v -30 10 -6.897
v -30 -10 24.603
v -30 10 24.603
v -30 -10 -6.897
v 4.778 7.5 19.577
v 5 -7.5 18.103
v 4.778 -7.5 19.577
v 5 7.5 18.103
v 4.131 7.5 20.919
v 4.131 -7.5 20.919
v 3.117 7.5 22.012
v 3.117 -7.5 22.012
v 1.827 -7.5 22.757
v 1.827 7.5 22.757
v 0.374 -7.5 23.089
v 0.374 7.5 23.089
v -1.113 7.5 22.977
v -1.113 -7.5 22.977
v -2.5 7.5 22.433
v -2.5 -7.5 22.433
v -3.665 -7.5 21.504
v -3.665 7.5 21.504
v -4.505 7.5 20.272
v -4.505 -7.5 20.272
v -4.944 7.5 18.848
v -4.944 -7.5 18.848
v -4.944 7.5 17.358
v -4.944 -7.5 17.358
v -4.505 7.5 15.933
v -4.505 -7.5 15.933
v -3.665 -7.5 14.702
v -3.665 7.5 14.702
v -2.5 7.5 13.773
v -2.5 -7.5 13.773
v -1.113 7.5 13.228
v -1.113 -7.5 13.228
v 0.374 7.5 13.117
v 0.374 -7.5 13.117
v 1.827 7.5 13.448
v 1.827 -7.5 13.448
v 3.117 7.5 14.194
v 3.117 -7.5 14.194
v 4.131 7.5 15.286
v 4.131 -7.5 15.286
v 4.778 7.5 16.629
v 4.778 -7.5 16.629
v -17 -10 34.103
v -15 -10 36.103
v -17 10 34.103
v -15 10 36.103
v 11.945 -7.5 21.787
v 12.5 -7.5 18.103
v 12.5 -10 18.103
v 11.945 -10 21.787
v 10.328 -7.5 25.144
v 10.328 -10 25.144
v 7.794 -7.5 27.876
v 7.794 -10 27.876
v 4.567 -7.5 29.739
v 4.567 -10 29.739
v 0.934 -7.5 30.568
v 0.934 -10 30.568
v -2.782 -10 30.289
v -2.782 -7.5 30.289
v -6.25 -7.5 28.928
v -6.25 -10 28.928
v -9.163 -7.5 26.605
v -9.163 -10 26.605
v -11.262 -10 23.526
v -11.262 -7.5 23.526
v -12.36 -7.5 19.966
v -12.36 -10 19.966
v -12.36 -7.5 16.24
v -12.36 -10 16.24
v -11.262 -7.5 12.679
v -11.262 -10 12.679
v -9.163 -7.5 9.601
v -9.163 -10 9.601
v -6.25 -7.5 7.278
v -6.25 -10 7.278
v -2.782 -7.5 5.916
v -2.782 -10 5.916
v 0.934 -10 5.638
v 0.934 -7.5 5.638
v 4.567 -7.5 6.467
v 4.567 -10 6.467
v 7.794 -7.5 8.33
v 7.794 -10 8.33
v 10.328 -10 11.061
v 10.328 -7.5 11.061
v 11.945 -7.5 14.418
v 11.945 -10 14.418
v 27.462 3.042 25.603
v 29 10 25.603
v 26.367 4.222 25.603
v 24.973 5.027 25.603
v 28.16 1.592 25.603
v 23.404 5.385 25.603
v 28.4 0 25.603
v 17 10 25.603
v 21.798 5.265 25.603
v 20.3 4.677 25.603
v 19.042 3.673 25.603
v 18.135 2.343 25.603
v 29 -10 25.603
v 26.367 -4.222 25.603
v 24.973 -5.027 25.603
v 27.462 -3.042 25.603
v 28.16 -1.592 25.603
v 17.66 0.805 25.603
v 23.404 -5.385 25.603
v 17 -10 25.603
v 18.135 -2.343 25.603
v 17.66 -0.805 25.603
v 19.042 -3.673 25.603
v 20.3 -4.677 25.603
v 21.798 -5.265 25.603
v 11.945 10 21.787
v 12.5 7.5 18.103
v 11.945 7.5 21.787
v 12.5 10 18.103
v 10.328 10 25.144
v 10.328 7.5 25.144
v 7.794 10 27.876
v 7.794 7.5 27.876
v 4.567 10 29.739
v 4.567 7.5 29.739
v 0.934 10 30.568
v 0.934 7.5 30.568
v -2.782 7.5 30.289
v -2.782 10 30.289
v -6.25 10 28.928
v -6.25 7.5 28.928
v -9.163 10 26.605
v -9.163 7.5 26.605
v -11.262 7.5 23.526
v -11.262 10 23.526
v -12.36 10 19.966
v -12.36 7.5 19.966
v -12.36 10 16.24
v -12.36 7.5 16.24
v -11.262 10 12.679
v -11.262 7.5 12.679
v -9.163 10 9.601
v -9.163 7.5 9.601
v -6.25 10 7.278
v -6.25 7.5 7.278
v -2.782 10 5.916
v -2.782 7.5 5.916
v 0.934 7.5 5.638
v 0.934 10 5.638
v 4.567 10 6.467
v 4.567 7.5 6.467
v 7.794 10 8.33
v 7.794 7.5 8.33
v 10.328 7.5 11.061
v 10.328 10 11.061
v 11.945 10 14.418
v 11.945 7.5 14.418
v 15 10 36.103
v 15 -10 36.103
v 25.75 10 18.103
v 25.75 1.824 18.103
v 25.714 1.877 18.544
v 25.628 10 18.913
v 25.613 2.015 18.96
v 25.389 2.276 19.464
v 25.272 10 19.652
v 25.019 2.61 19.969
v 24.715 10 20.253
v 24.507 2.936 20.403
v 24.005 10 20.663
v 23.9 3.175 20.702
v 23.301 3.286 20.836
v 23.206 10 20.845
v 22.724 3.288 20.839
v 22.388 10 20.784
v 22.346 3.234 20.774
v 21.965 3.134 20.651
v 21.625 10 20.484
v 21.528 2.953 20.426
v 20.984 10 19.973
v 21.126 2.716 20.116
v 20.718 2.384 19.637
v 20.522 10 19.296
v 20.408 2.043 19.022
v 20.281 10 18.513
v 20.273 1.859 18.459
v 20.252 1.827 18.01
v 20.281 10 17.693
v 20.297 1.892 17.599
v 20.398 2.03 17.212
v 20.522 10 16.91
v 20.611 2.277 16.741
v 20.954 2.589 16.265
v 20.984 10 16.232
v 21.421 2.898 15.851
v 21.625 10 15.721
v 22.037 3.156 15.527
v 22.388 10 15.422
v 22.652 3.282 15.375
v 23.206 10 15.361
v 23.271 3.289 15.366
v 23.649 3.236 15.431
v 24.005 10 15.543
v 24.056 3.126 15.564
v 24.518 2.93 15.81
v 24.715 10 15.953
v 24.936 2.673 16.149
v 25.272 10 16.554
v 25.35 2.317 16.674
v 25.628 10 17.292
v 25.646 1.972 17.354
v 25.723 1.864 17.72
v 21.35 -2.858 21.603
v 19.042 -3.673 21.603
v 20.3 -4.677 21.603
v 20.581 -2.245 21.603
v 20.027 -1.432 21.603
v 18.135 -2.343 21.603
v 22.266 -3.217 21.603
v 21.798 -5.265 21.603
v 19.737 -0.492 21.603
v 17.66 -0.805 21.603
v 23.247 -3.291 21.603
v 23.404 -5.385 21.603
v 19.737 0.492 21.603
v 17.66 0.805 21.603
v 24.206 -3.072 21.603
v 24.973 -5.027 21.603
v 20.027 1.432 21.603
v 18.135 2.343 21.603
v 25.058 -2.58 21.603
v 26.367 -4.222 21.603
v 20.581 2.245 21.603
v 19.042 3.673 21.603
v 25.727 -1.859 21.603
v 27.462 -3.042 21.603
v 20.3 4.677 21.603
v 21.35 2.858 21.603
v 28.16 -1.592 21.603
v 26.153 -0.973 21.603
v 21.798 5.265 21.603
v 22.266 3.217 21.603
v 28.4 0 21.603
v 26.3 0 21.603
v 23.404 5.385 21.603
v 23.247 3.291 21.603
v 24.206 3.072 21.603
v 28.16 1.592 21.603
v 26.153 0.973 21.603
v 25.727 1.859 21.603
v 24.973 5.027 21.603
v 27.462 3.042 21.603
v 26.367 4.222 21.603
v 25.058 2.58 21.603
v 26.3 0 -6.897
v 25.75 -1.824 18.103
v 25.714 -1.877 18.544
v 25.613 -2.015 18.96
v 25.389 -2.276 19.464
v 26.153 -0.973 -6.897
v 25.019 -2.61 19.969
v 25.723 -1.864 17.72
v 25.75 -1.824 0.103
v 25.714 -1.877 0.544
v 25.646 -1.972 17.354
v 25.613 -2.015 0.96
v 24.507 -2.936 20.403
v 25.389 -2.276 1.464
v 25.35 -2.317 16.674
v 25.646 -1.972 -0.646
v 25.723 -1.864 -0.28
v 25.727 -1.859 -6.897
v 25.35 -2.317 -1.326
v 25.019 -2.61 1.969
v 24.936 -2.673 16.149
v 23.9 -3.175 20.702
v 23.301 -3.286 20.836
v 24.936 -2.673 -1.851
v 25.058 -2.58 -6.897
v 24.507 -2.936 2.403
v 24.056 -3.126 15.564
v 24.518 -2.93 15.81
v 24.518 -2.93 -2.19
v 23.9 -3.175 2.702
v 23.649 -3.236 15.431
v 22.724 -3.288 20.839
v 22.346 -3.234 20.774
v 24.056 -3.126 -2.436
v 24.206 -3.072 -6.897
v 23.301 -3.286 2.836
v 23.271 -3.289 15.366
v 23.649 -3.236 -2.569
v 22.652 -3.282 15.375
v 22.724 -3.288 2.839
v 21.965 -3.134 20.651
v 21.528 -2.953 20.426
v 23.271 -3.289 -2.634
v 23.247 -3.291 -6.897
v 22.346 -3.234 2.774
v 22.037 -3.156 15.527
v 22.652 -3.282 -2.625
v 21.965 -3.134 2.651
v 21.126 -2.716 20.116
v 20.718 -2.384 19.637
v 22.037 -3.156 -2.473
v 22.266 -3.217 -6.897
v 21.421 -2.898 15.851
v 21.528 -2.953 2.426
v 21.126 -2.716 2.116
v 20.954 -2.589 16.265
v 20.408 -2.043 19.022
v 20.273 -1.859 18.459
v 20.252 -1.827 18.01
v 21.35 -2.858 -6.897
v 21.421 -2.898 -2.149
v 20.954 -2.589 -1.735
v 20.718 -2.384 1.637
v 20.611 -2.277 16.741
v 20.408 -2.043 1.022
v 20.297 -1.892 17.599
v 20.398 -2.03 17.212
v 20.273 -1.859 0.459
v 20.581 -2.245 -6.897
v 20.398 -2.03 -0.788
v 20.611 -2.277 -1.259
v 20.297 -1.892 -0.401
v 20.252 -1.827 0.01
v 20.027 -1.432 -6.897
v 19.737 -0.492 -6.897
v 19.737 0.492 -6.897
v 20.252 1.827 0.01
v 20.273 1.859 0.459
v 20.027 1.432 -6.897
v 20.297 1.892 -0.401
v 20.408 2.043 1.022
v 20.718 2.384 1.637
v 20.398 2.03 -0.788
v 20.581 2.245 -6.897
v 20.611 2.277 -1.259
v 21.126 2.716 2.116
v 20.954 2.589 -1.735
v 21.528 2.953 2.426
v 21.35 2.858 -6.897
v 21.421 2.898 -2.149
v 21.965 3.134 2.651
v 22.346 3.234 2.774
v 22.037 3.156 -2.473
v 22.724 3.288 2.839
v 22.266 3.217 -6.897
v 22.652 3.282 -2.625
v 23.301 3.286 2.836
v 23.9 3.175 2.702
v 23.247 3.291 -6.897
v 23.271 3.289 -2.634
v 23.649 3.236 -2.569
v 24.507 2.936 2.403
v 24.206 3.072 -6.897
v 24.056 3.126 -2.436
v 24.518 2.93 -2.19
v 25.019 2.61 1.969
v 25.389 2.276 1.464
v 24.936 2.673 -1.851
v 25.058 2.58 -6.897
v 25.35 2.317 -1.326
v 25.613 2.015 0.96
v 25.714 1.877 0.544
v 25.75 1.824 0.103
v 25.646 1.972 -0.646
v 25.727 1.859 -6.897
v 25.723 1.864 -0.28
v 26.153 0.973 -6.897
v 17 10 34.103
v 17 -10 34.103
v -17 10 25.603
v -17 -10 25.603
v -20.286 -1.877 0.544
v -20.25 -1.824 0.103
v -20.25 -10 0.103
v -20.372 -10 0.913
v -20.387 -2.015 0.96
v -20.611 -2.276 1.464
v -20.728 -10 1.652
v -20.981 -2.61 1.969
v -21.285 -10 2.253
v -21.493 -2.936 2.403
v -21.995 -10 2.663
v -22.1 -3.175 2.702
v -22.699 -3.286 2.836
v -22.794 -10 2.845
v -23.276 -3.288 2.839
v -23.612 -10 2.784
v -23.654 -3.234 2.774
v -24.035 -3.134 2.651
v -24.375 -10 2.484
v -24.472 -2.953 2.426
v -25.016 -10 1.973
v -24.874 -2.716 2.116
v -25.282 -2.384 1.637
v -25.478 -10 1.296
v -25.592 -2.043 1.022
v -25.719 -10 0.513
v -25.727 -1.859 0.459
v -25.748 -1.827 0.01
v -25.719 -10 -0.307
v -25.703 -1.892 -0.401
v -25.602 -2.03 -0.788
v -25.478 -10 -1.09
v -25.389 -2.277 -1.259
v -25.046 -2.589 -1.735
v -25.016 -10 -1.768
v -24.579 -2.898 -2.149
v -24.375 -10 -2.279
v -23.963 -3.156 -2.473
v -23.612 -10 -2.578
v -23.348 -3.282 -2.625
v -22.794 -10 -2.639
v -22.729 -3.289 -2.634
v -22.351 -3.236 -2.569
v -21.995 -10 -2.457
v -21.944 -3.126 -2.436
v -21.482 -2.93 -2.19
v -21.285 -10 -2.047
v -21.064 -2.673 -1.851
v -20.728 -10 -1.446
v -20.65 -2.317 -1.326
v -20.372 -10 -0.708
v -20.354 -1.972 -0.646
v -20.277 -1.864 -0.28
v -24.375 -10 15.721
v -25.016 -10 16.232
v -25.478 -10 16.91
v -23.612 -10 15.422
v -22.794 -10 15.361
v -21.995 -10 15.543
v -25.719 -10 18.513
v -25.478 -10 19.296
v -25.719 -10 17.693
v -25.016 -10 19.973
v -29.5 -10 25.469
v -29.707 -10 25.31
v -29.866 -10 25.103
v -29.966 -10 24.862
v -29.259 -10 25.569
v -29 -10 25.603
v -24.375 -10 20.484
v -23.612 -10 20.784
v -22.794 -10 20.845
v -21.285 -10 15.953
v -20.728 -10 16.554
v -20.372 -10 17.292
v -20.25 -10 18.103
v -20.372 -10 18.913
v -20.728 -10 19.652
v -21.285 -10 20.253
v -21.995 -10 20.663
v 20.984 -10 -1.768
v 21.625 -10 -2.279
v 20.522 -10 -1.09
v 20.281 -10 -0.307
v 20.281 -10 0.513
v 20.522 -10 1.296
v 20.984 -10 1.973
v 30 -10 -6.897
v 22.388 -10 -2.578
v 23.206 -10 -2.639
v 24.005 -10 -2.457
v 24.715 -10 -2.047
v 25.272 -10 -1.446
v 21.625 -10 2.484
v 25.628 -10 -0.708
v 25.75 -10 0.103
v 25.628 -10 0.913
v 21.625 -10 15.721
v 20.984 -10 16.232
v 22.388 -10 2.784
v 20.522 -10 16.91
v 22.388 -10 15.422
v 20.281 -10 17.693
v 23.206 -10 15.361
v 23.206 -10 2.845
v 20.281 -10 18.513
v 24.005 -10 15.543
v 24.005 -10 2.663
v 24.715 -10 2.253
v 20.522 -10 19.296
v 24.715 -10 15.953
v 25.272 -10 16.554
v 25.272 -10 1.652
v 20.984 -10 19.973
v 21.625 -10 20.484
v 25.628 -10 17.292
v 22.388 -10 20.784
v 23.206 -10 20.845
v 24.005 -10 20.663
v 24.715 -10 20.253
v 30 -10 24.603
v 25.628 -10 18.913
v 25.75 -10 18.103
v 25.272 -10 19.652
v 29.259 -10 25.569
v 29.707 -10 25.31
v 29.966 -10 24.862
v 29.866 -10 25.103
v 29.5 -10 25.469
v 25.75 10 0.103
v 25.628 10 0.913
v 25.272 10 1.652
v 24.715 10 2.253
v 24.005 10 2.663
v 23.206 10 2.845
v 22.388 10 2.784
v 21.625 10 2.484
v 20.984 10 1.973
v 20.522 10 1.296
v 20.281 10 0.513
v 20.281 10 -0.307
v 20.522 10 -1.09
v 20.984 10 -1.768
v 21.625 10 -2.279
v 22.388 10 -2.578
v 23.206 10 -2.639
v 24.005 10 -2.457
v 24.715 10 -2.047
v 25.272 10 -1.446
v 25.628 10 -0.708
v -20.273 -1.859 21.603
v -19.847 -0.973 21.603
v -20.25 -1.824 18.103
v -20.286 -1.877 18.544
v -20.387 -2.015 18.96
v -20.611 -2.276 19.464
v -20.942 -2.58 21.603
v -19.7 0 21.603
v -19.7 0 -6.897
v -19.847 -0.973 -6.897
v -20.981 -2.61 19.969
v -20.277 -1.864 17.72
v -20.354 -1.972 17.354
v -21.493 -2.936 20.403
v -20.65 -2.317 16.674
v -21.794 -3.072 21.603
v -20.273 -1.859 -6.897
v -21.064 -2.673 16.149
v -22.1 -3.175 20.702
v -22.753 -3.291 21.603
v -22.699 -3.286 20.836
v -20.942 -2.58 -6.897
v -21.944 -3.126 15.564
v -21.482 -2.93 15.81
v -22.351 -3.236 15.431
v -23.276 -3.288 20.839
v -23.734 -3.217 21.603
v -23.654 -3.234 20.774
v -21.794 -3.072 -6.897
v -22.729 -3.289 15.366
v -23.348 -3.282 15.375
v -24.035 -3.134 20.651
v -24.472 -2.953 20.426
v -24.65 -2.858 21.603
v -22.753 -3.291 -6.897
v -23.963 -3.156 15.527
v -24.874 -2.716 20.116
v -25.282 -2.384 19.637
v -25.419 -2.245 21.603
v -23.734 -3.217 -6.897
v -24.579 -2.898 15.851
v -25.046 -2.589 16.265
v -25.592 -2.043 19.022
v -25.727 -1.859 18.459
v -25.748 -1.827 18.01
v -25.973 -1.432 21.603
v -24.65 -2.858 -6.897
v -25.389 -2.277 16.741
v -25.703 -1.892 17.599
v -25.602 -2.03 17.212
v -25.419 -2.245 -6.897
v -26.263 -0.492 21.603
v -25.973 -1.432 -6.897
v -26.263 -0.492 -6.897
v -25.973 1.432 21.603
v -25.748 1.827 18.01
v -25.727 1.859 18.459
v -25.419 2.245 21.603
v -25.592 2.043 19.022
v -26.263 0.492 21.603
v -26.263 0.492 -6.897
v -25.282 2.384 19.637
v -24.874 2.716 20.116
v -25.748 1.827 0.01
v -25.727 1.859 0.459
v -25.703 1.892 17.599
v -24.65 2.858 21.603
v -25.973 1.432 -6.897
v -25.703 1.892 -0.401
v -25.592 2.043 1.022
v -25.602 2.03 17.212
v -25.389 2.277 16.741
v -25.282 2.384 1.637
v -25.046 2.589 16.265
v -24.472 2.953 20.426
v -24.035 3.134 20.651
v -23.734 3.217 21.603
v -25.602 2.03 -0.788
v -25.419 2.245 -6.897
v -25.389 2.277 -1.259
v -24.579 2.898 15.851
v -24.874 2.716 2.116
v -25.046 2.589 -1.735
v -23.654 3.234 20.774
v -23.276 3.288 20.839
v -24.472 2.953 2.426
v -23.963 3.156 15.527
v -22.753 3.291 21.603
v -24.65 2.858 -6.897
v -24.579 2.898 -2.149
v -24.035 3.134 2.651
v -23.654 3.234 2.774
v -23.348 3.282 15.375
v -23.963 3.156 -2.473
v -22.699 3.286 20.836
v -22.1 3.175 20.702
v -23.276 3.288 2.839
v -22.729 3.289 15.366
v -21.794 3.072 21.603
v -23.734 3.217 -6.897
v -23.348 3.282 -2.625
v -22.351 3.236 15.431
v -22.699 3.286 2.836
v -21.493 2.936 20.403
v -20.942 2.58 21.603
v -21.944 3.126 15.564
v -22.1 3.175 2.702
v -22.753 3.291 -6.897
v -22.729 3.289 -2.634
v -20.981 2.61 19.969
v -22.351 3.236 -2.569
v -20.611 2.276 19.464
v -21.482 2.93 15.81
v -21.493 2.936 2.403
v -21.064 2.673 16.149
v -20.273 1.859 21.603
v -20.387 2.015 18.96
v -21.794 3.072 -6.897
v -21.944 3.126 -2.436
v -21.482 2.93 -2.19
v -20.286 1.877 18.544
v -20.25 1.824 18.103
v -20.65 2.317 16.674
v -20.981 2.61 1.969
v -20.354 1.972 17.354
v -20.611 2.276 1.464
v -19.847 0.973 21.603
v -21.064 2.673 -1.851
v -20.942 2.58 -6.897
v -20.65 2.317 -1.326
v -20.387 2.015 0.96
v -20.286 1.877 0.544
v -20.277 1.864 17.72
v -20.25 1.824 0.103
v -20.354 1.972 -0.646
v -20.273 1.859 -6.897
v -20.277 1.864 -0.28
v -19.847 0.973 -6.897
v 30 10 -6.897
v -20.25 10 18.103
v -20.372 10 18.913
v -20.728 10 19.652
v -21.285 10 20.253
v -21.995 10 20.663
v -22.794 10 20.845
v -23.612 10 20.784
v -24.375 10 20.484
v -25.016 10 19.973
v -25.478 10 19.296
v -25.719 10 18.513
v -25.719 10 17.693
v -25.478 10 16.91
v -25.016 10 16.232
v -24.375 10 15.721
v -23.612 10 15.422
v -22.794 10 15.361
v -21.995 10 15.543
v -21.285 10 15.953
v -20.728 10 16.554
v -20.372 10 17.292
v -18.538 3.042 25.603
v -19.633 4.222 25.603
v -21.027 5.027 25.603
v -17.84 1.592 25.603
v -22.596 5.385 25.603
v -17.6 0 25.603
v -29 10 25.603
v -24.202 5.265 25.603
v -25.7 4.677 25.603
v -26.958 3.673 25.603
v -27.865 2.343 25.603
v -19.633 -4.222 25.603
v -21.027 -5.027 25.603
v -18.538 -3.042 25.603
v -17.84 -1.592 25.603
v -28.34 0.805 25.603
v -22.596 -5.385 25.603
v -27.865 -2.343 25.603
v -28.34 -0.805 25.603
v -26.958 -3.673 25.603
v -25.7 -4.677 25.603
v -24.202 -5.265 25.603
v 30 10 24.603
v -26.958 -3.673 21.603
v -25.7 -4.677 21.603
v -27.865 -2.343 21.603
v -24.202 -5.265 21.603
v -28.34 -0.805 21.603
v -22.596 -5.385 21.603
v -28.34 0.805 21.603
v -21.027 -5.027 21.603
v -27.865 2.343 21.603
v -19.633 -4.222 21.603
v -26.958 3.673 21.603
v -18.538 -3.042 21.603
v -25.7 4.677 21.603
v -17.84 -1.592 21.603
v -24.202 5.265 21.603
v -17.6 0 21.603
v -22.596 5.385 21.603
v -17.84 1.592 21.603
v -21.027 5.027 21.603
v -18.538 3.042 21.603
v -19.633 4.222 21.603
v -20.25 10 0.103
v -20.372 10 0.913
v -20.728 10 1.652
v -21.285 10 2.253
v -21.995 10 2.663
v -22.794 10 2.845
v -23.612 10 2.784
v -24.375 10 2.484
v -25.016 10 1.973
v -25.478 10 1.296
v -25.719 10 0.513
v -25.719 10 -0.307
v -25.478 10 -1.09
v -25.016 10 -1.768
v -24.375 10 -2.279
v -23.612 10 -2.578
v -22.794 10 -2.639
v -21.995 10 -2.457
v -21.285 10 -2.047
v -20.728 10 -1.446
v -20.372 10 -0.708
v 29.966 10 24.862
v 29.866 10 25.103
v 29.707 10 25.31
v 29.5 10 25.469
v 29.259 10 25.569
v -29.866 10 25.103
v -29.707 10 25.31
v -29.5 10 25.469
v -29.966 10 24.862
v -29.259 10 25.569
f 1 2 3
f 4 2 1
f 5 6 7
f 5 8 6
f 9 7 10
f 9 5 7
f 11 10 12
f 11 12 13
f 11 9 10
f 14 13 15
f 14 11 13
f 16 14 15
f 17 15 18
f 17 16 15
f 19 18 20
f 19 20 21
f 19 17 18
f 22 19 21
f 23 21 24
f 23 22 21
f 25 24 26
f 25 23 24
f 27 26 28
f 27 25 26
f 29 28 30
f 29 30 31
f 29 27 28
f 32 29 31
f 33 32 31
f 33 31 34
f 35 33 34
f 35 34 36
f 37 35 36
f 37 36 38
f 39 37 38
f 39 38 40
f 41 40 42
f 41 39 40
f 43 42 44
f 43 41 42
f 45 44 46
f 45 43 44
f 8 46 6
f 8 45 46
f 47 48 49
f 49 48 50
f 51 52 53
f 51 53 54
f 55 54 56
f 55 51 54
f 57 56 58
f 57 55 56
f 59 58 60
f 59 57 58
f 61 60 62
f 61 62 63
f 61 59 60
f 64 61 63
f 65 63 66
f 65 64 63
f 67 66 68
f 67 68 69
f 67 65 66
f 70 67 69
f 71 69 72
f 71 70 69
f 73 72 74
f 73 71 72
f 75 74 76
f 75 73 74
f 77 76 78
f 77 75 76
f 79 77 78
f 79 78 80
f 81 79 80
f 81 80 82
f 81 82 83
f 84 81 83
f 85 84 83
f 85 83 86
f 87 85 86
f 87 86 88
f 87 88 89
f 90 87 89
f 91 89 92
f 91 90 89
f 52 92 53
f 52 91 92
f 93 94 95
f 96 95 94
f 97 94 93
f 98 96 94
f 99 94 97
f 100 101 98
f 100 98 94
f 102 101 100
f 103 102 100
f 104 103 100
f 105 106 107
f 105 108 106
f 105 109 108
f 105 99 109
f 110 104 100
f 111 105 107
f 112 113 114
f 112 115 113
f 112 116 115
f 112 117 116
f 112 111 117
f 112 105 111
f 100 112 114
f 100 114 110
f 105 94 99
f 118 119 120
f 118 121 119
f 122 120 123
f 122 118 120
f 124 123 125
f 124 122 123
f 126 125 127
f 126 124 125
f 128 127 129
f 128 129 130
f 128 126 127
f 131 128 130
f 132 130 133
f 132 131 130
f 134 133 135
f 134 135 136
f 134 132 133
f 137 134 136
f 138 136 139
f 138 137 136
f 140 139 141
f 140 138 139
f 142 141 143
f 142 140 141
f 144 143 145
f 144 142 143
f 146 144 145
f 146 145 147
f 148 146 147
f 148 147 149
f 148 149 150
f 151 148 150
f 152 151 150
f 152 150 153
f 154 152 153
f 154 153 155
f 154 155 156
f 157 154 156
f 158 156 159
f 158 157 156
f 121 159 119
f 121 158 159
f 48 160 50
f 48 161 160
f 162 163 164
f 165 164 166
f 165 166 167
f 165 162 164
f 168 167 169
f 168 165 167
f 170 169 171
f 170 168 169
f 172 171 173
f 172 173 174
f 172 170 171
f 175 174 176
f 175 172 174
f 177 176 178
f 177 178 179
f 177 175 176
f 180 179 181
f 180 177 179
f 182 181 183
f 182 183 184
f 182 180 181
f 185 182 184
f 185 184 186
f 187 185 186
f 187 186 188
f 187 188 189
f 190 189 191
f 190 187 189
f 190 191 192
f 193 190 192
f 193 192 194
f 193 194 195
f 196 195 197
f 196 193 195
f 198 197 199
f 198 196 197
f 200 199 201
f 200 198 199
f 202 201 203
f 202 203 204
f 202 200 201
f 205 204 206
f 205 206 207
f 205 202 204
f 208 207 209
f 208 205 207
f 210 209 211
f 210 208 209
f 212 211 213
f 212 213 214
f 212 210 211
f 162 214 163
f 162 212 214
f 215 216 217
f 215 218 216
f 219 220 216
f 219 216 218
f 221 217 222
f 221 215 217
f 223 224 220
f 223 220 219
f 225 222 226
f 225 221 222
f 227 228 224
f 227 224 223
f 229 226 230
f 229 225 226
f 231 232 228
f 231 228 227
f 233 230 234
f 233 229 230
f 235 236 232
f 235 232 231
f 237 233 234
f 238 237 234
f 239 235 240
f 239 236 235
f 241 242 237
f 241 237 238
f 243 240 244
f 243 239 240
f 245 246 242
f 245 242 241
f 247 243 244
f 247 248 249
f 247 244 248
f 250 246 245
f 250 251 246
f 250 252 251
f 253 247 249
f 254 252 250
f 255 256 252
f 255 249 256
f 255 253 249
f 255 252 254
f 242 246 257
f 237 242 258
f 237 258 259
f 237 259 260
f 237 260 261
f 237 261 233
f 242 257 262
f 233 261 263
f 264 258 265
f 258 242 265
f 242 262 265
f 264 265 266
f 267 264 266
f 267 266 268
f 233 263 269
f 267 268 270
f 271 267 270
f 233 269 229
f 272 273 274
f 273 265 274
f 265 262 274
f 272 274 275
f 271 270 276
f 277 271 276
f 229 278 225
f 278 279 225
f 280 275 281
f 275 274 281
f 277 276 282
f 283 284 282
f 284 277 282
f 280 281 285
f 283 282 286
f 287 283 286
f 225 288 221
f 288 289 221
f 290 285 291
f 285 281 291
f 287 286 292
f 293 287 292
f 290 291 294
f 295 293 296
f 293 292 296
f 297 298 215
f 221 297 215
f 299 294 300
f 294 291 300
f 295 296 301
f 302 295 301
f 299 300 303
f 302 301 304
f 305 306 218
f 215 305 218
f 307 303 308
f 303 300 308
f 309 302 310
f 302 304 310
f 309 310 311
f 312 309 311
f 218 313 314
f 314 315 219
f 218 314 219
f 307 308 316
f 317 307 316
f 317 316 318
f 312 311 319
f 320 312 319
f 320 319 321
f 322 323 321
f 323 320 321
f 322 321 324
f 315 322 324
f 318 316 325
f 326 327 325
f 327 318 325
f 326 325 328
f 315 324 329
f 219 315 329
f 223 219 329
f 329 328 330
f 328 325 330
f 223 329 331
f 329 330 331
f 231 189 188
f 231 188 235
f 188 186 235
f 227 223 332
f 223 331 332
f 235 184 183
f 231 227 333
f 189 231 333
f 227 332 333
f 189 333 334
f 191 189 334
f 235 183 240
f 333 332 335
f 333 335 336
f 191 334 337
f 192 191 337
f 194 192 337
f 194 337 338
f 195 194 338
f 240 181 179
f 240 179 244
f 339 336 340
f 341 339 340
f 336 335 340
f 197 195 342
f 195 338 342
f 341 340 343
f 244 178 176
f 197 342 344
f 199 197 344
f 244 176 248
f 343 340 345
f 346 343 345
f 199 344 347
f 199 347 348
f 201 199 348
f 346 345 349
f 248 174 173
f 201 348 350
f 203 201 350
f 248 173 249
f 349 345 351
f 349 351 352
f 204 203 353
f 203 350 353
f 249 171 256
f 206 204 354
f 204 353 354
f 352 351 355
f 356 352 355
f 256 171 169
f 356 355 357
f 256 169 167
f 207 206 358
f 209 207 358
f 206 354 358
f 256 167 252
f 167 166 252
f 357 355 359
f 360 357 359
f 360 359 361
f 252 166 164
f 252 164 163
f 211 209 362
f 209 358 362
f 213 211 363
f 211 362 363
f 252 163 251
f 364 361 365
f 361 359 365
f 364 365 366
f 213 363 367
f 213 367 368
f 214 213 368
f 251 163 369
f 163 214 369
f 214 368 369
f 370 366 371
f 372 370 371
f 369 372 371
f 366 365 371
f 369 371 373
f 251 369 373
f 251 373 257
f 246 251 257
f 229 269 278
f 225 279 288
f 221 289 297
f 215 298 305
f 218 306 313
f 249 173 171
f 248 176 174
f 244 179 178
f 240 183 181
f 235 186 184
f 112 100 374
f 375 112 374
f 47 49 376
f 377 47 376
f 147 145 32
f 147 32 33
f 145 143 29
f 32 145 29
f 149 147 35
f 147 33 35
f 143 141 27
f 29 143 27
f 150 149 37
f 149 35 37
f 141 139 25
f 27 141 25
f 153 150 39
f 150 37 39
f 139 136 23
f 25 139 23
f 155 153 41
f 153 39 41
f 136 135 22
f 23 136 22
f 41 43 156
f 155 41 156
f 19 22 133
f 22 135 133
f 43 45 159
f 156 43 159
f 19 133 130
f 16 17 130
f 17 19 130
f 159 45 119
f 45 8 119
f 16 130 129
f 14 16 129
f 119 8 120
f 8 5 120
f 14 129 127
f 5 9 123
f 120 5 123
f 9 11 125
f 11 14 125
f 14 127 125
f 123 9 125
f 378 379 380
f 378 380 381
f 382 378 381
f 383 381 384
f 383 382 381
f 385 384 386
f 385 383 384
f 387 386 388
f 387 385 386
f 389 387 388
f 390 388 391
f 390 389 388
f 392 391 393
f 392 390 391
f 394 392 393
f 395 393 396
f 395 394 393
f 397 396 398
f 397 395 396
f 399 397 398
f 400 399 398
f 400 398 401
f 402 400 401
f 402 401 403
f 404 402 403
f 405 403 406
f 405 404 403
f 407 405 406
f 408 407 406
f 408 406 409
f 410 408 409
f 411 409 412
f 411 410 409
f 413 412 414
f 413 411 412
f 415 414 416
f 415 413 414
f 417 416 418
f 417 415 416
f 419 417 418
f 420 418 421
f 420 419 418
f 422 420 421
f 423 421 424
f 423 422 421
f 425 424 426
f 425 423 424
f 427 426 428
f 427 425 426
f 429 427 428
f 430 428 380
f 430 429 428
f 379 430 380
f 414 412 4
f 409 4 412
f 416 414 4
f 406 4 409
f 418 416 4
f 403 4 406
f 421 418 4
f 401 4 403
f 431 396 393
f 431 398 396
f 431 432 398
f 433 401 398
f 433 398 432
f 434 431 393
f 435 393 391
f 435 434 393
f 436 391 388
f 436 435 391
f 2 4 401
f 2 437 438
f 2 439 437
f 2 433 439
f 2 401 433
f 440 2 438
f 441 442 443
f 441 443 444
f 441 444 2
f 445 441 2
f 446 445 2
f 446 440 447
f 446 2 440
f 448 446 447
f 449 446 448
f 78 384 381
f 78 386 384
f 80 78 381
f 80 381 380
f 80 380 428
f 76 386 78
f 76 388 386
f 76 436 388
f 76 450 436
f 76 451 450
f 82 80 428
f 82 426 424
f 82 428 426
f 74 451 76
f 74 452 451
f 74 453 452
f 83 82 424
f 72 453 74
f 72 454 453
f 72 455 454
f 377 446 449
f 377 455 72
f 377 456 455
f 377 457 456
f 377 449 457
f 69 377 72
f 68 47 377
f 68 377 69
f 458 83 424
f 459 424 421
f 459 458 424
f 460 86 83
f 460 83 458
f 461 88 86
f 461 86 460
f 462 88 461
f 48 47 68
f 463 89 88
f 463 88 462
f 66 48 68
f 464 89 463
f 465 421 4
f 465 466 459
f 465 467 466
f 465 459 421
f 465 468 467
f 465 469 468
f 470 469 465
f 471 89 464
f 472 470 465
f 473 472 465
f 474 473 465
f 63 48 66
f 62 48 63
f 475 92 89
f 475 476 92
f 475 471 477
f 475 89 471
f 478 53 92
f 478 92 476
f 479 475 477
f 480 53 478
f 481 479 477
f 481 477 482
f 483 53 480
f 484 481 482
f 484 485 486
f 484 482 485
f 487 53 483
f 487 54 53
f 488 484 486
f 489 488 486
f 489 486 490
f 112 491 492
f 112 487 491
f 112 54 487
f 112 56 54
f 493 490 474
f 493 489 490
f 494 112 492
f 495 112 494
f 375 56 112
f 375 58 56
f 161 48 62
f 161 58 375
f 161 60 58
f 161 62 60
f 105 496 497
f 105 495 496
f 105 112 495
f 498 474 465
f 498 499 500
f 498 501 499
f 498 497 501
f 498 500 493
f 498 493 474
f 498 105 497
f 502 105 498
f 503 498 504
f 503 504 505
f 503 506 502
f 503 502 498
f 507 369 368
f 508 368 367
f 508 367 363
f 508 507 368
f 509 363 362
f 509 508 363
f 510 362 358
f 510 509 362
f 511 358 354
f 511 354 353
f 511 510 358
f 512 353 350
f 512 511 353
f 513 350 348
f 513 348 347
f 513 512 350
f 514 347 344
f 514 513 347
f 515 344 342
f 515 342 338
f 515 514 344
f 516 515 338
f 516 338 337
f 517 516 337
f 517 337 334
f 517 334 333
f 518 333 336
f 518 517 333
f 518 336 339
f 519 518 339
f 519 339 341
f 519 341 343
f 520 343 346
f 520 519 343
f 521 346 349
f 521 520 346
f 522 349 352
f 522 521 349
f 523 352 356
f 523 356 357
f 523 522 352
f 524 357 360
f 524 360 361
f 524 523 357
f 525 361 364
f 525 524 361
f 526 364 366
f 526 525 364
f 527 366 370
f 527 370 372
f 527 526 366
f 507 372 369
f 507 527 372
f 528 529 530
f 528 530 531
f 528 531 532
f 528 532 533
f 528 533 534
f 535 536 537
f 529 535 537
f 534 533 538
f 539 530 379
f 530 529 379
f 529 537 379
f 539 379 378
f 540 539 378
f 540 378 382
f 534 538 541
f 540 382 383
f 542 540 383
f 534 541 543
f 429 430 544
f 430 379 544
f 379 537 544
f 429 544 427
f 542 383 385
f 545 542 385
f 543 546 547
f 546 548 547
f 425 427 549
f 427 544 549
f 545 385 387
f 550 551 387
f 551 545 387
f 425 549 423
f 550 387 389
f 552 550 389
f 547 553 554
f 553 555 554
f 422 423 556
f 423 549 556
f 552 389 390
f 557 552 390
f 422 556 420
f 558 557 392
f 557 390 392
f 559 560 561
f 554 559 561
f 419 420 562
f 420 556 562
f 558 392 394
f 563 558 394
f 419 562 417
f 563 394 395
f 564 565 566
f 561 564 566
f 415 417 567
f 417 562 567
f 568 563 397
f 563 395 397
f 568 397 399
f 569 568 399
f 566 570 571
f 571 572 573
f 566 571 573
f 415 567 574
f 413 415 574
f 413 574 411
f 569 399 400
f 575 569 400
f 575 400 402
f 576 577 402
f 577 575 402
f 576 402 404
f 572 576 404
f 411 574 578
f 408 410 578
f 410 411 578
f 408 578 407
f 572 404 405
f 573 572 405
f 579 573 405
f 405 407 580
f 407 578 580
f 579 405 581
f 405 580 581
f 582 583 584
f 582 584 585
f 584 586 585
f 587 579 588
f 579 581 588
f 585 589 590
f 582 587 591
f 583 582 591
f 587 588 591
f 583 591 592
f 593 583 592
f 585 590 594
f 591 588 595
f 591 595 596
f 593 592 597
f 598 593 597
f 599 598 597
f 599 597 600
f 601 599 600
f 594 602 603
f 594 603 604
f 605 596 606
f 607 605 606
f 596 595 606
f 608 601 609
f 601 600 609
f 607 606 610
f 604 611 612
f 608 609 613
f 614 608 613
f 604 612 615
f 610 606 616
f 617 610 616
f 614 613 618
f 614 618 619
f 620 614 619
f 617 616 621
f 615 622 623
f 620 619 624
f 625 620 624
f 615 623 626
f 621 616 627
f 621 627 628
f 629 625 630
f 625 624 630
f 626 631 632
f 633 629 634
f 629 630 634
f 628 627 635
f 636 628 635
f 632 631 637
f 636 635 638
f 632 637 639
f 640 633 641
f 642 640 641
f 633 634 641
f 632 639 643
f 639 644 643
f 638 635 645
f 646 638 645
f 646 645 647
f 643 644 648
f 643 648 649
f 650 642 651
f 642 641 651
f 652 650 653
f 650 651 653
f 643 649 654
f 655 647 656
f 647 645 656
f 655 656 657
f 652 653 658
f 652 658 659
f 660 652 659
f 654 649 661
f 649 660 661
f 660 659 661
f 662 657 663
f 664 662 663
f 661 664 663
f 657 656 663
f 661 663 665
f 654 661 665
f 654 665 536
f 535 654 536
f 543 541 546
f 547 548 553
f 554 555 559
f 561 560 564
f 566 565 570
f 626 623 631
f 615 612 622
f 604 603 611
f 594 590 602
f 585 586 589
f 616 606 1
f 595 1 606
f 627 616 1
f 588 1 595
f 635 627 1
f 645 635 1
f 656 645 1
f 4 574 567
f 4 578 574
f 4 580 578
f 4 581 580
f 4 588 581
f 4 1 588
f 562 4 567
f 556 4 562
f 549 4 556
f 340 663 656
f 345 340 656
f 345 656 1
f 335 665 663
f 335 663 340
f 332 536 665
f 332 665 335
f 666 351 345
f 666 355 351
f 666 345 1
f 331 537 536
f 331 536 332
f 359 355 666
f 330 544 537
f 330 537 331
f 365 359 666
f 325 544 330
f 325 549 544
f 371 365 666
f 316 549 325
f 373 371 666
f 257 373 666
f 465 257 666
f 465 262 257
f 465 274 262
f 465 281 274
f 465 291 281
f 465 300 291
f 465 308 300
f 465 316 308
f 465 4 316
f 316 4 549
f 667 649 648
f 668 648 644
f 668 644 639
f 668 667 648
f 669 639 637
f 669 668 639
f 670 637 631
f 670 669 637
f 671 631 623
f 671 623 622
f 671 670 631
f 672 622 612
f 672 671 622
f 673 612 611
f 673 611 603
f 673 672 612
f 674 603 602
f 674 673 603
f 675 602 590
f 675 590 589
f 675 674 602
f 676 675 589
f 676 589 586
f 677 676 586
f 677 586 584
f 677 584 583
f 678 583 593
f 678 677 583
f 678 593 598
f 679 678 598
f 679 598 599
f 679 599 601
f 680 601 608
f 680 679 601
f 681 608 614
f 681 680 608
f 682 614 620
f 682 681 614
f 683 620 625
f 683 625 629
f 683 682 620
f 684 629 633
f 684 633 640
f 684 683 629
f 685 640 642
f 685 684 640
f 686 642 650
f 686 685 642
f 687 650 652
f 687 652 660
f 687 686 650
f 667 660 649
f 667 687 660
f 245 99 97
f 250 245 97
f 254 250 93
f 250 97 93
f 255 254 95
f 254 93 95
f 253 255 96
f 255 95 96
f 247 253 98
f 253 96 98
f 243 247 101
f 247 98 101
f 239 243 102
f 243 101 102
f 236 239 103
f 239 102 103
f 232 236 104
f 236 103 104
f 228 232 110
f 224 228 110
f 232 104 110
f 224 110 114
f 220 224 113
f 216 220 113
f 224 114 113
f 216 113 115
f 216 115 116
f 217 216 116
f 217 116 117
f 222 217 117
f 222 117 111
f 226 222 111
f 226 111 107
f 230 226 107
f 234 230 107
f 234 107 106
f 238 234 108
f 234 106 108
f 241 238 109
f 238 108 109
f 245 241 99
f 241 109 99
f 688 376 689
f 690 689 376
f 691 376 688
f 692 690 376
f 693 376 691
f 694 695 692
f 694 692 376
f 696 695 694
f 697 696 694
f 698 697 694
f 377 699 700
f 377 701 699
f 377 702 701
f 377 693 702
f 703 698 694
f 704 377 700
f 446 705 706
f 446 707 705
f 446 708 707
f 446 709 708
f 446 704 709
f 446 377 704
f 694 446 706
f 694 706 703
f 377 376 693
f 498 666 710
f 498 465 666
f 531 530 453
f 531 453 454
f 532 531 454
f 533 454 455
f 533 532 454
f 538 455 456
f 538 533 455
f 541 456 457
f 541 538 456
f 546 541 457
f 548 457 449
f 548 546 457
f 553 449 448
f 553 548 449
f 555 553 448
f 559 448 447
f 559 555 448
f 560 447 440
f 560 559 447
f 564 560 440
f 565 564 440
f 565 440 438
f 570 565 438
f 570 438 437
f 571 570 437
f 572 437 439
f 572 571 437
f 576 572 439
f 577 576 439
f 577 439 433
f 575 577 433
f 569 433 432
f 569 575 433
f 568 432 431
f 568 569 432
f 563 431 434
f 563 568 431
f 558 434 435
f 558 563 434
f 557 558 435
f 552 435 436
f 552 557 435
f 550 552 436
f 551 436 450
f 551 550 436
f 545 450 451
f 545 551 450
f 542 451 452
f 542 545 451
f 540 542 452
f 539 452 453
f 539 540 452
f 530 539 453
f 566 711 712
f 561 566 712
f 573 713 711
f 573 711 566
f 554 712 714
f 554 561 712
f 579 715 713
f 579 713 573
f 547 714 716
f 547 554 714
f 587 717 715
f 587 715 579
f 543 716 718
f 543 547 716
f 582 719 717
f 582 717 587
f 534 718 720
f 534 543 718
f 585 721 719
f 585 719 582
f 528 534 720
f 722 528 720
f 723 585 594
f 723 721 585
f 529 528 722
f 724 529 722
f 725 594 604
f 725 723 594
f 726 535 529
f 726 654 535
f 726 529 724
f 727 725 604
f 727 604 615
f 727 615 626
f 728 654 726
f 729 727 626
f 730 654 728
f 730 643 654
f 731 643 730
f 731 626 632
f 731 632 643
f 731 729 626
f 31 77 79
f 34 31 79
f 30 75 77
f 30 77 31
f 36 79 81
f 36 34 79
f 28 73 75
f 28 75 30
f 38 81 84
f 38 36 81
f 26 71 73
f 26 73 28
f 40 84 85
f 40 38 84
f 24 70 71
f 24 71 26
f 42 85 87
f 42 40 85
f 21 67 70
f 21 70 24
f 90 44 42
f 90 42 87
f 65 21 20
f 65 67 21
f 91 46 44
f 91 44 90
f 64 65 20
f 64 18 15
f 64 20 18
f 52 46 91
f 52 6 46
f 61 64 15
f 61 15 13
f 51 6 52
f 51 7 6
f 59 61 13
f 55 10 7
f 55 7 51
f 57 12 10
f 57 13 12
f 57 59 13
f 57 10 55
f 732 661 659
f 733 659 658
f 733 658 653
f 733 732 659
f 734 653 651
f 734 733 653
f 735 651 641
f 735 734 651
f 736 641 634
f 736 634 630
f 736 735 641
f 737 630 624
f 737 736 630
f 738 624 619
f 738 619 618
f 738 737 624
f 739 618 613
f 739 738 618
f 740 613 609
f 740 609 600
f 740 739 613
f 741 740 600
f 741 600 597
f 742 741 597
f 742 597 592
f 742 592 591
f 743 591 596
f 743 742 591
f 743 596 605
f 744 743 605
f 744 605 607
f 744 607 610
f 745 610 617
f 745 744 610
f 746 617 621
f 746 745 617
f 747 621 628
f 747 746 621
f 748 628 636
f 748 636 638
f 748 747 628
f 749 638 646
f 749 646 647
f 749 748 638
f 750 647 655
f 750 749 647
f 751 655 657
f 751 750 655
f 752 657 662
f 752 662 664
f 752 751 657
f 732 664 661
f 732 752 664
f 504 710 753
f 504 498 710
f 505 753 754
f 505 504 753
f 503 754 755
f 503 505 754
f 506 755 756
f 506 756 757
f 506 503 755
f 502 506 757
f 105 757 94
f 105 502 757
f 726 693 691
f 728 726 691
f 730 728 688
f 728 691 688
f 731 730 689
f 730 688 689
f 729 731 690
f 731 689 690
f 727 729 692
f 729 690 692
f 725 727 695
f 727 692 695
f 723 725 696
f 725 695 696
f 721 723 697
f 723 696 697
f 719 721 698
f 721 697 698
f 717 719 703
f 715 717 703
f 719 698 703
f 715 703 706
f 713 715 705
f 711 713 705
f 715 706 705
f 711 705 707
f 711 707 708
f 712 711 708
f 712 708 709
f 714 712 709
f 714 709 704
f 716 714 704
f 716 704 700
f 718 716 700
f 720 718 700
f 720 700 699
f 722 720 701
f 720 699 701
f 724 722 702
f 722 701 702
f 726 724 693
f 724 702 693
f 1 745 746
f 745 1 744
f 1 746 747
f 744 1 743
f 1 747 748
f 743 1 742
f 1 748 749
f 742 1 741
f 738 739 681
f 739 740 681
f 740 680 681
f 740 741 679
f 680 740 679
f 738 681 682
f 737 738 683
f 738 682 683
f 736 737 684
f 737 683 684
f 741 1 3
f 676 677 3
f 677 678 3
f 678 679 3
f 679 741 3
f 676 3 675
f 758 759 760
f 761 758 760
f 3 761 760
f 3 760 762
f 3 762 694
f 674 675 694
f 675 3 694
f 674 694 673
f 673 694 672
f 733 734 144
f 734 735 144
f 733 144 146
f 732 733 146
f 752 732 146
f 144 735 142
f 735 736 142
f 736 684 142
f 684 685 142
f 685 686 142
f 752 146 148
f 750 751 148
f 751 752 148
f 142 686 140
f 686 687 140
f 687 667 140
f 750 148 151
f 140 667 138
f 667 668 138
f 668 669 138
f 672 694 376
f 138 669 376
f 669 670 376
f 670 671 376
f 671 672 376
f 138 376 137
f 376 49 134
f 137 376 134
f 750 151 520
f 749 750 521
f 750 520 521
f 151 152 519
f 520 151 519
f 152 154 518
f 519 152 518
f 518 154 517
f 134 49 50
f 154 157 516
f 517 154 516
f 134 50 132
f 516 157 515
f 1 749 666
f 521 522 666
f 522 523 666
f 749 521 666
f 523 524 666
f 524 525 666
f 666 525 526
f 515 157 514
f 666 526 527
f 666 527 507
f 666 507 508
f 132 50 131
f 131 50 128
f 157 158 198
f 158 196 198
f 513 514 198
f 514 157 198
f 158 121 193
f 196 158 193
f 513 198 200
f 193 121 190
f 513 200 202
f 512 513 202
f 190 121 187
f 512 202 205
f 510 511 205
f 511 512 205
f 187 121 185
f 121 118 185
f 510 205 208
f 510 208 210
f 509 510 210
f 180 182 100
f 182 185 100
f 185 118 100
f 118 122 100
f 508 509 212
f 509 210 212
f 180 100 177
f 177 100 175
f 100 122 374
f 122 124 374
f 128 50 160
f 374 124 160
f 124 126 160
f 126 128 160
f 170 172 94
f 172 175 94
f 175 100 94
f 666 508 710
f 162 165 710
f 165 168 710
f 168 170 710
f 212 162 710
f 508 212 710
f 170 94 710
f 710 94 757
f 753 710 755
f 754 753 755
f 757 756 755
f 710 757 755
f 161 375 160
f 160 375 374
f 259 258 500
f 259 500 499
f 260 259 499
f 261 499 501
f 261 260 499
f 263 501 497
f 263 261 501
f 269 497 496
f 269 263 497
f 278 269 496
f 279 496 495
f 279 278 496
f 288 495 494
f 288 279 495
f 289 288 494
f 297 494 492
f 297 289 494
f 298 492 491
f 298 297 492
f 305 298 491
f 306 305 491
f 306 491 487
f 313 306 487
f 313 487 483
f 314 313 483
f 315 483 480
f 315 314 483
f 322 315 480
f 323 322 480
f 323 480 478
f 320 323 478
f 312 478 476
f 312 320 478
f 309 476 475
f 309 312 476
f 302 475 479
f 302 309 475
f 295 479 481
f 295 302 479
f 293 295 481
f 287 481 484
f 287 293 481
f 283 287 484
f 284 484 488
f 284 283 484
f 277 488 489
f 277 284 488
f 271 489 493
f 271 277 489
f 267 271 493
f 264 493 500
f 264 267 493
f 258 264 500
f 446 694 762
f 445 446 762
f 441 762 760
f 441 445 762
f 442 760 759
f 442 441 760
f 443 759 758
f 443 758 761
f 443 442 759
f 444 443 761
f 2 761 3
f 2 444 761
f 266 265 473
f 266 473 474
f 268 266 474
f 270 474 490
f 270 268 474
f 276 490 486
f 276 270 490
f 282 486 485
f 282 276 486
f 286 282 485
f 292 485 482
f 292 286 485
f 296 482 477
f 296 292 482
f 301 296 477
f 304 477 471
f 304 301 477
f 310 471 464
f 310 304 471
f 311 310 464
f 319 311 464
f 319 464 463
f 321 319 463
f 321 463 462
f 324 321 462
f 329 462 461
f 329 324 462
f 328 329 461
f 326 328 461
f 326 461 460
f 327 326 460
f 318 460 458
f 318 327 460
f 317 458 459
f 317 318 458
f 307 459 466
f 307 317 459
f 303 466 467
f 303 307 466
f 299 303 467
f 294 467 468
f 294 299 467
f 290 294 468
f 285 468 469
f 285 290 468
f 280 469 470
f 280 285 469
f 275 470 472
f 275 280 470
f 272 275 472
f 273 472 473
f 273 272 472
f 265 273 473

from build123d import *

# Parameters (mm, degrees)
F0_R     = 2.75
F0_R_2   = 12.5
F1_DEPTH = 10
F0_R_3   = 5
F2_DEPTH = 7.5
F3_SIZE  = 2
F4_R     = 1
F5_R     = 3.3
F6_DEPTH = 32.5
F7_R     = 5.4
F7_R_2   = 3.3
F8_DEPTH = 4


with BuildPart() as f1:
    # F0 (on Front) → F1 (new body, symmetric)
    with BuildSketch(Plane.XZ):
        Polygon((-17, 25.6028276384), (-30, 25.6028276384), (-30, -6.8971723616), (30, -6.8971723616), (30, 25.6028276384), (17, 25.6028276384), (17, 36.1028276384), (-17, 36.1028276384), align=None)
        with Locations((-23, 0.1028276384)):
            Circle(F0_R, mode=Mode.SUBTRACT)
        with Locations((23, 0.1028276384)):
            Circle(F0_R, mode=Mode.SUBTRACT)
        with Locations((-23, 18.1028276384)):
            Circle(F0_R, mode=Mode.SUBTRACT)
        with Locations((0, 18.1028276384)):
            Circle(F0_R_2, mode=Mode.SUBTRACT)
        with Locations((23, 18.1028276384)):
            Circle(F0_R, mode=Mode.SUBTRACT)
    extrude(amount=F1_DEPTH, both=True)

    # F0 (on Front) → F2 (join, symmetric)
    with BuildSketch(Plane.XZ):
        with Locations((0, 18.1028276384)):
            Circle(F0_R_2)
        with Locations((0, 18.1028276384)):
            Circle(F0_R_3, mode=Mode.SUBTRACT)
    extrude(amount=F2_DEPTH, both=True)

    # F3
    f3_edges = [f1.edges().sort_by_distance(p)[0] for p in [
        (-17, 0, 36.102828),
        (17, 0, 36.102828),
    ]]
    chamfer(f3_edges, length=F3_SIZE)

    # F4
    f4_edges = [f1.edges().sort_by_distance(p)[0] for p in [
        (-30, 0, 25.602828),
        (30, 0, 25.602828),
    ]]
    fillet(f4_edges, radius=F4_R)

    # F5 (on face) → F6 (cut)
    with BuildSketch(Plane(origin=(0, 0, -6.8971723616), x_dir=(1, 0, 0), z_dir=(0, 0, -1))):
        with Locations((23, 0)):
            Circle(F5_R)
        with Locations((-23, 0)):
            Circle(F5_R)
    extrude(amount=-F6_DEPTH, mode=Mode.SUBTRACT)

    # F7 (on face) → F8 (cut)
    with BuildSketch(Plane.XY.offset(25.6028276384)):
        with Locations((23, 0)):
            Circle(F7_R)
        with Locations((23, 0)):
            Circle(F7_R_2, mode=Mode.SUBTRACT)
        with Locations((-23, 0)):
            Circle(F7_R)
    extrude(amount=-F8_DEPTH, mode=Mode.SUBTRACT)


solid = f1.part
